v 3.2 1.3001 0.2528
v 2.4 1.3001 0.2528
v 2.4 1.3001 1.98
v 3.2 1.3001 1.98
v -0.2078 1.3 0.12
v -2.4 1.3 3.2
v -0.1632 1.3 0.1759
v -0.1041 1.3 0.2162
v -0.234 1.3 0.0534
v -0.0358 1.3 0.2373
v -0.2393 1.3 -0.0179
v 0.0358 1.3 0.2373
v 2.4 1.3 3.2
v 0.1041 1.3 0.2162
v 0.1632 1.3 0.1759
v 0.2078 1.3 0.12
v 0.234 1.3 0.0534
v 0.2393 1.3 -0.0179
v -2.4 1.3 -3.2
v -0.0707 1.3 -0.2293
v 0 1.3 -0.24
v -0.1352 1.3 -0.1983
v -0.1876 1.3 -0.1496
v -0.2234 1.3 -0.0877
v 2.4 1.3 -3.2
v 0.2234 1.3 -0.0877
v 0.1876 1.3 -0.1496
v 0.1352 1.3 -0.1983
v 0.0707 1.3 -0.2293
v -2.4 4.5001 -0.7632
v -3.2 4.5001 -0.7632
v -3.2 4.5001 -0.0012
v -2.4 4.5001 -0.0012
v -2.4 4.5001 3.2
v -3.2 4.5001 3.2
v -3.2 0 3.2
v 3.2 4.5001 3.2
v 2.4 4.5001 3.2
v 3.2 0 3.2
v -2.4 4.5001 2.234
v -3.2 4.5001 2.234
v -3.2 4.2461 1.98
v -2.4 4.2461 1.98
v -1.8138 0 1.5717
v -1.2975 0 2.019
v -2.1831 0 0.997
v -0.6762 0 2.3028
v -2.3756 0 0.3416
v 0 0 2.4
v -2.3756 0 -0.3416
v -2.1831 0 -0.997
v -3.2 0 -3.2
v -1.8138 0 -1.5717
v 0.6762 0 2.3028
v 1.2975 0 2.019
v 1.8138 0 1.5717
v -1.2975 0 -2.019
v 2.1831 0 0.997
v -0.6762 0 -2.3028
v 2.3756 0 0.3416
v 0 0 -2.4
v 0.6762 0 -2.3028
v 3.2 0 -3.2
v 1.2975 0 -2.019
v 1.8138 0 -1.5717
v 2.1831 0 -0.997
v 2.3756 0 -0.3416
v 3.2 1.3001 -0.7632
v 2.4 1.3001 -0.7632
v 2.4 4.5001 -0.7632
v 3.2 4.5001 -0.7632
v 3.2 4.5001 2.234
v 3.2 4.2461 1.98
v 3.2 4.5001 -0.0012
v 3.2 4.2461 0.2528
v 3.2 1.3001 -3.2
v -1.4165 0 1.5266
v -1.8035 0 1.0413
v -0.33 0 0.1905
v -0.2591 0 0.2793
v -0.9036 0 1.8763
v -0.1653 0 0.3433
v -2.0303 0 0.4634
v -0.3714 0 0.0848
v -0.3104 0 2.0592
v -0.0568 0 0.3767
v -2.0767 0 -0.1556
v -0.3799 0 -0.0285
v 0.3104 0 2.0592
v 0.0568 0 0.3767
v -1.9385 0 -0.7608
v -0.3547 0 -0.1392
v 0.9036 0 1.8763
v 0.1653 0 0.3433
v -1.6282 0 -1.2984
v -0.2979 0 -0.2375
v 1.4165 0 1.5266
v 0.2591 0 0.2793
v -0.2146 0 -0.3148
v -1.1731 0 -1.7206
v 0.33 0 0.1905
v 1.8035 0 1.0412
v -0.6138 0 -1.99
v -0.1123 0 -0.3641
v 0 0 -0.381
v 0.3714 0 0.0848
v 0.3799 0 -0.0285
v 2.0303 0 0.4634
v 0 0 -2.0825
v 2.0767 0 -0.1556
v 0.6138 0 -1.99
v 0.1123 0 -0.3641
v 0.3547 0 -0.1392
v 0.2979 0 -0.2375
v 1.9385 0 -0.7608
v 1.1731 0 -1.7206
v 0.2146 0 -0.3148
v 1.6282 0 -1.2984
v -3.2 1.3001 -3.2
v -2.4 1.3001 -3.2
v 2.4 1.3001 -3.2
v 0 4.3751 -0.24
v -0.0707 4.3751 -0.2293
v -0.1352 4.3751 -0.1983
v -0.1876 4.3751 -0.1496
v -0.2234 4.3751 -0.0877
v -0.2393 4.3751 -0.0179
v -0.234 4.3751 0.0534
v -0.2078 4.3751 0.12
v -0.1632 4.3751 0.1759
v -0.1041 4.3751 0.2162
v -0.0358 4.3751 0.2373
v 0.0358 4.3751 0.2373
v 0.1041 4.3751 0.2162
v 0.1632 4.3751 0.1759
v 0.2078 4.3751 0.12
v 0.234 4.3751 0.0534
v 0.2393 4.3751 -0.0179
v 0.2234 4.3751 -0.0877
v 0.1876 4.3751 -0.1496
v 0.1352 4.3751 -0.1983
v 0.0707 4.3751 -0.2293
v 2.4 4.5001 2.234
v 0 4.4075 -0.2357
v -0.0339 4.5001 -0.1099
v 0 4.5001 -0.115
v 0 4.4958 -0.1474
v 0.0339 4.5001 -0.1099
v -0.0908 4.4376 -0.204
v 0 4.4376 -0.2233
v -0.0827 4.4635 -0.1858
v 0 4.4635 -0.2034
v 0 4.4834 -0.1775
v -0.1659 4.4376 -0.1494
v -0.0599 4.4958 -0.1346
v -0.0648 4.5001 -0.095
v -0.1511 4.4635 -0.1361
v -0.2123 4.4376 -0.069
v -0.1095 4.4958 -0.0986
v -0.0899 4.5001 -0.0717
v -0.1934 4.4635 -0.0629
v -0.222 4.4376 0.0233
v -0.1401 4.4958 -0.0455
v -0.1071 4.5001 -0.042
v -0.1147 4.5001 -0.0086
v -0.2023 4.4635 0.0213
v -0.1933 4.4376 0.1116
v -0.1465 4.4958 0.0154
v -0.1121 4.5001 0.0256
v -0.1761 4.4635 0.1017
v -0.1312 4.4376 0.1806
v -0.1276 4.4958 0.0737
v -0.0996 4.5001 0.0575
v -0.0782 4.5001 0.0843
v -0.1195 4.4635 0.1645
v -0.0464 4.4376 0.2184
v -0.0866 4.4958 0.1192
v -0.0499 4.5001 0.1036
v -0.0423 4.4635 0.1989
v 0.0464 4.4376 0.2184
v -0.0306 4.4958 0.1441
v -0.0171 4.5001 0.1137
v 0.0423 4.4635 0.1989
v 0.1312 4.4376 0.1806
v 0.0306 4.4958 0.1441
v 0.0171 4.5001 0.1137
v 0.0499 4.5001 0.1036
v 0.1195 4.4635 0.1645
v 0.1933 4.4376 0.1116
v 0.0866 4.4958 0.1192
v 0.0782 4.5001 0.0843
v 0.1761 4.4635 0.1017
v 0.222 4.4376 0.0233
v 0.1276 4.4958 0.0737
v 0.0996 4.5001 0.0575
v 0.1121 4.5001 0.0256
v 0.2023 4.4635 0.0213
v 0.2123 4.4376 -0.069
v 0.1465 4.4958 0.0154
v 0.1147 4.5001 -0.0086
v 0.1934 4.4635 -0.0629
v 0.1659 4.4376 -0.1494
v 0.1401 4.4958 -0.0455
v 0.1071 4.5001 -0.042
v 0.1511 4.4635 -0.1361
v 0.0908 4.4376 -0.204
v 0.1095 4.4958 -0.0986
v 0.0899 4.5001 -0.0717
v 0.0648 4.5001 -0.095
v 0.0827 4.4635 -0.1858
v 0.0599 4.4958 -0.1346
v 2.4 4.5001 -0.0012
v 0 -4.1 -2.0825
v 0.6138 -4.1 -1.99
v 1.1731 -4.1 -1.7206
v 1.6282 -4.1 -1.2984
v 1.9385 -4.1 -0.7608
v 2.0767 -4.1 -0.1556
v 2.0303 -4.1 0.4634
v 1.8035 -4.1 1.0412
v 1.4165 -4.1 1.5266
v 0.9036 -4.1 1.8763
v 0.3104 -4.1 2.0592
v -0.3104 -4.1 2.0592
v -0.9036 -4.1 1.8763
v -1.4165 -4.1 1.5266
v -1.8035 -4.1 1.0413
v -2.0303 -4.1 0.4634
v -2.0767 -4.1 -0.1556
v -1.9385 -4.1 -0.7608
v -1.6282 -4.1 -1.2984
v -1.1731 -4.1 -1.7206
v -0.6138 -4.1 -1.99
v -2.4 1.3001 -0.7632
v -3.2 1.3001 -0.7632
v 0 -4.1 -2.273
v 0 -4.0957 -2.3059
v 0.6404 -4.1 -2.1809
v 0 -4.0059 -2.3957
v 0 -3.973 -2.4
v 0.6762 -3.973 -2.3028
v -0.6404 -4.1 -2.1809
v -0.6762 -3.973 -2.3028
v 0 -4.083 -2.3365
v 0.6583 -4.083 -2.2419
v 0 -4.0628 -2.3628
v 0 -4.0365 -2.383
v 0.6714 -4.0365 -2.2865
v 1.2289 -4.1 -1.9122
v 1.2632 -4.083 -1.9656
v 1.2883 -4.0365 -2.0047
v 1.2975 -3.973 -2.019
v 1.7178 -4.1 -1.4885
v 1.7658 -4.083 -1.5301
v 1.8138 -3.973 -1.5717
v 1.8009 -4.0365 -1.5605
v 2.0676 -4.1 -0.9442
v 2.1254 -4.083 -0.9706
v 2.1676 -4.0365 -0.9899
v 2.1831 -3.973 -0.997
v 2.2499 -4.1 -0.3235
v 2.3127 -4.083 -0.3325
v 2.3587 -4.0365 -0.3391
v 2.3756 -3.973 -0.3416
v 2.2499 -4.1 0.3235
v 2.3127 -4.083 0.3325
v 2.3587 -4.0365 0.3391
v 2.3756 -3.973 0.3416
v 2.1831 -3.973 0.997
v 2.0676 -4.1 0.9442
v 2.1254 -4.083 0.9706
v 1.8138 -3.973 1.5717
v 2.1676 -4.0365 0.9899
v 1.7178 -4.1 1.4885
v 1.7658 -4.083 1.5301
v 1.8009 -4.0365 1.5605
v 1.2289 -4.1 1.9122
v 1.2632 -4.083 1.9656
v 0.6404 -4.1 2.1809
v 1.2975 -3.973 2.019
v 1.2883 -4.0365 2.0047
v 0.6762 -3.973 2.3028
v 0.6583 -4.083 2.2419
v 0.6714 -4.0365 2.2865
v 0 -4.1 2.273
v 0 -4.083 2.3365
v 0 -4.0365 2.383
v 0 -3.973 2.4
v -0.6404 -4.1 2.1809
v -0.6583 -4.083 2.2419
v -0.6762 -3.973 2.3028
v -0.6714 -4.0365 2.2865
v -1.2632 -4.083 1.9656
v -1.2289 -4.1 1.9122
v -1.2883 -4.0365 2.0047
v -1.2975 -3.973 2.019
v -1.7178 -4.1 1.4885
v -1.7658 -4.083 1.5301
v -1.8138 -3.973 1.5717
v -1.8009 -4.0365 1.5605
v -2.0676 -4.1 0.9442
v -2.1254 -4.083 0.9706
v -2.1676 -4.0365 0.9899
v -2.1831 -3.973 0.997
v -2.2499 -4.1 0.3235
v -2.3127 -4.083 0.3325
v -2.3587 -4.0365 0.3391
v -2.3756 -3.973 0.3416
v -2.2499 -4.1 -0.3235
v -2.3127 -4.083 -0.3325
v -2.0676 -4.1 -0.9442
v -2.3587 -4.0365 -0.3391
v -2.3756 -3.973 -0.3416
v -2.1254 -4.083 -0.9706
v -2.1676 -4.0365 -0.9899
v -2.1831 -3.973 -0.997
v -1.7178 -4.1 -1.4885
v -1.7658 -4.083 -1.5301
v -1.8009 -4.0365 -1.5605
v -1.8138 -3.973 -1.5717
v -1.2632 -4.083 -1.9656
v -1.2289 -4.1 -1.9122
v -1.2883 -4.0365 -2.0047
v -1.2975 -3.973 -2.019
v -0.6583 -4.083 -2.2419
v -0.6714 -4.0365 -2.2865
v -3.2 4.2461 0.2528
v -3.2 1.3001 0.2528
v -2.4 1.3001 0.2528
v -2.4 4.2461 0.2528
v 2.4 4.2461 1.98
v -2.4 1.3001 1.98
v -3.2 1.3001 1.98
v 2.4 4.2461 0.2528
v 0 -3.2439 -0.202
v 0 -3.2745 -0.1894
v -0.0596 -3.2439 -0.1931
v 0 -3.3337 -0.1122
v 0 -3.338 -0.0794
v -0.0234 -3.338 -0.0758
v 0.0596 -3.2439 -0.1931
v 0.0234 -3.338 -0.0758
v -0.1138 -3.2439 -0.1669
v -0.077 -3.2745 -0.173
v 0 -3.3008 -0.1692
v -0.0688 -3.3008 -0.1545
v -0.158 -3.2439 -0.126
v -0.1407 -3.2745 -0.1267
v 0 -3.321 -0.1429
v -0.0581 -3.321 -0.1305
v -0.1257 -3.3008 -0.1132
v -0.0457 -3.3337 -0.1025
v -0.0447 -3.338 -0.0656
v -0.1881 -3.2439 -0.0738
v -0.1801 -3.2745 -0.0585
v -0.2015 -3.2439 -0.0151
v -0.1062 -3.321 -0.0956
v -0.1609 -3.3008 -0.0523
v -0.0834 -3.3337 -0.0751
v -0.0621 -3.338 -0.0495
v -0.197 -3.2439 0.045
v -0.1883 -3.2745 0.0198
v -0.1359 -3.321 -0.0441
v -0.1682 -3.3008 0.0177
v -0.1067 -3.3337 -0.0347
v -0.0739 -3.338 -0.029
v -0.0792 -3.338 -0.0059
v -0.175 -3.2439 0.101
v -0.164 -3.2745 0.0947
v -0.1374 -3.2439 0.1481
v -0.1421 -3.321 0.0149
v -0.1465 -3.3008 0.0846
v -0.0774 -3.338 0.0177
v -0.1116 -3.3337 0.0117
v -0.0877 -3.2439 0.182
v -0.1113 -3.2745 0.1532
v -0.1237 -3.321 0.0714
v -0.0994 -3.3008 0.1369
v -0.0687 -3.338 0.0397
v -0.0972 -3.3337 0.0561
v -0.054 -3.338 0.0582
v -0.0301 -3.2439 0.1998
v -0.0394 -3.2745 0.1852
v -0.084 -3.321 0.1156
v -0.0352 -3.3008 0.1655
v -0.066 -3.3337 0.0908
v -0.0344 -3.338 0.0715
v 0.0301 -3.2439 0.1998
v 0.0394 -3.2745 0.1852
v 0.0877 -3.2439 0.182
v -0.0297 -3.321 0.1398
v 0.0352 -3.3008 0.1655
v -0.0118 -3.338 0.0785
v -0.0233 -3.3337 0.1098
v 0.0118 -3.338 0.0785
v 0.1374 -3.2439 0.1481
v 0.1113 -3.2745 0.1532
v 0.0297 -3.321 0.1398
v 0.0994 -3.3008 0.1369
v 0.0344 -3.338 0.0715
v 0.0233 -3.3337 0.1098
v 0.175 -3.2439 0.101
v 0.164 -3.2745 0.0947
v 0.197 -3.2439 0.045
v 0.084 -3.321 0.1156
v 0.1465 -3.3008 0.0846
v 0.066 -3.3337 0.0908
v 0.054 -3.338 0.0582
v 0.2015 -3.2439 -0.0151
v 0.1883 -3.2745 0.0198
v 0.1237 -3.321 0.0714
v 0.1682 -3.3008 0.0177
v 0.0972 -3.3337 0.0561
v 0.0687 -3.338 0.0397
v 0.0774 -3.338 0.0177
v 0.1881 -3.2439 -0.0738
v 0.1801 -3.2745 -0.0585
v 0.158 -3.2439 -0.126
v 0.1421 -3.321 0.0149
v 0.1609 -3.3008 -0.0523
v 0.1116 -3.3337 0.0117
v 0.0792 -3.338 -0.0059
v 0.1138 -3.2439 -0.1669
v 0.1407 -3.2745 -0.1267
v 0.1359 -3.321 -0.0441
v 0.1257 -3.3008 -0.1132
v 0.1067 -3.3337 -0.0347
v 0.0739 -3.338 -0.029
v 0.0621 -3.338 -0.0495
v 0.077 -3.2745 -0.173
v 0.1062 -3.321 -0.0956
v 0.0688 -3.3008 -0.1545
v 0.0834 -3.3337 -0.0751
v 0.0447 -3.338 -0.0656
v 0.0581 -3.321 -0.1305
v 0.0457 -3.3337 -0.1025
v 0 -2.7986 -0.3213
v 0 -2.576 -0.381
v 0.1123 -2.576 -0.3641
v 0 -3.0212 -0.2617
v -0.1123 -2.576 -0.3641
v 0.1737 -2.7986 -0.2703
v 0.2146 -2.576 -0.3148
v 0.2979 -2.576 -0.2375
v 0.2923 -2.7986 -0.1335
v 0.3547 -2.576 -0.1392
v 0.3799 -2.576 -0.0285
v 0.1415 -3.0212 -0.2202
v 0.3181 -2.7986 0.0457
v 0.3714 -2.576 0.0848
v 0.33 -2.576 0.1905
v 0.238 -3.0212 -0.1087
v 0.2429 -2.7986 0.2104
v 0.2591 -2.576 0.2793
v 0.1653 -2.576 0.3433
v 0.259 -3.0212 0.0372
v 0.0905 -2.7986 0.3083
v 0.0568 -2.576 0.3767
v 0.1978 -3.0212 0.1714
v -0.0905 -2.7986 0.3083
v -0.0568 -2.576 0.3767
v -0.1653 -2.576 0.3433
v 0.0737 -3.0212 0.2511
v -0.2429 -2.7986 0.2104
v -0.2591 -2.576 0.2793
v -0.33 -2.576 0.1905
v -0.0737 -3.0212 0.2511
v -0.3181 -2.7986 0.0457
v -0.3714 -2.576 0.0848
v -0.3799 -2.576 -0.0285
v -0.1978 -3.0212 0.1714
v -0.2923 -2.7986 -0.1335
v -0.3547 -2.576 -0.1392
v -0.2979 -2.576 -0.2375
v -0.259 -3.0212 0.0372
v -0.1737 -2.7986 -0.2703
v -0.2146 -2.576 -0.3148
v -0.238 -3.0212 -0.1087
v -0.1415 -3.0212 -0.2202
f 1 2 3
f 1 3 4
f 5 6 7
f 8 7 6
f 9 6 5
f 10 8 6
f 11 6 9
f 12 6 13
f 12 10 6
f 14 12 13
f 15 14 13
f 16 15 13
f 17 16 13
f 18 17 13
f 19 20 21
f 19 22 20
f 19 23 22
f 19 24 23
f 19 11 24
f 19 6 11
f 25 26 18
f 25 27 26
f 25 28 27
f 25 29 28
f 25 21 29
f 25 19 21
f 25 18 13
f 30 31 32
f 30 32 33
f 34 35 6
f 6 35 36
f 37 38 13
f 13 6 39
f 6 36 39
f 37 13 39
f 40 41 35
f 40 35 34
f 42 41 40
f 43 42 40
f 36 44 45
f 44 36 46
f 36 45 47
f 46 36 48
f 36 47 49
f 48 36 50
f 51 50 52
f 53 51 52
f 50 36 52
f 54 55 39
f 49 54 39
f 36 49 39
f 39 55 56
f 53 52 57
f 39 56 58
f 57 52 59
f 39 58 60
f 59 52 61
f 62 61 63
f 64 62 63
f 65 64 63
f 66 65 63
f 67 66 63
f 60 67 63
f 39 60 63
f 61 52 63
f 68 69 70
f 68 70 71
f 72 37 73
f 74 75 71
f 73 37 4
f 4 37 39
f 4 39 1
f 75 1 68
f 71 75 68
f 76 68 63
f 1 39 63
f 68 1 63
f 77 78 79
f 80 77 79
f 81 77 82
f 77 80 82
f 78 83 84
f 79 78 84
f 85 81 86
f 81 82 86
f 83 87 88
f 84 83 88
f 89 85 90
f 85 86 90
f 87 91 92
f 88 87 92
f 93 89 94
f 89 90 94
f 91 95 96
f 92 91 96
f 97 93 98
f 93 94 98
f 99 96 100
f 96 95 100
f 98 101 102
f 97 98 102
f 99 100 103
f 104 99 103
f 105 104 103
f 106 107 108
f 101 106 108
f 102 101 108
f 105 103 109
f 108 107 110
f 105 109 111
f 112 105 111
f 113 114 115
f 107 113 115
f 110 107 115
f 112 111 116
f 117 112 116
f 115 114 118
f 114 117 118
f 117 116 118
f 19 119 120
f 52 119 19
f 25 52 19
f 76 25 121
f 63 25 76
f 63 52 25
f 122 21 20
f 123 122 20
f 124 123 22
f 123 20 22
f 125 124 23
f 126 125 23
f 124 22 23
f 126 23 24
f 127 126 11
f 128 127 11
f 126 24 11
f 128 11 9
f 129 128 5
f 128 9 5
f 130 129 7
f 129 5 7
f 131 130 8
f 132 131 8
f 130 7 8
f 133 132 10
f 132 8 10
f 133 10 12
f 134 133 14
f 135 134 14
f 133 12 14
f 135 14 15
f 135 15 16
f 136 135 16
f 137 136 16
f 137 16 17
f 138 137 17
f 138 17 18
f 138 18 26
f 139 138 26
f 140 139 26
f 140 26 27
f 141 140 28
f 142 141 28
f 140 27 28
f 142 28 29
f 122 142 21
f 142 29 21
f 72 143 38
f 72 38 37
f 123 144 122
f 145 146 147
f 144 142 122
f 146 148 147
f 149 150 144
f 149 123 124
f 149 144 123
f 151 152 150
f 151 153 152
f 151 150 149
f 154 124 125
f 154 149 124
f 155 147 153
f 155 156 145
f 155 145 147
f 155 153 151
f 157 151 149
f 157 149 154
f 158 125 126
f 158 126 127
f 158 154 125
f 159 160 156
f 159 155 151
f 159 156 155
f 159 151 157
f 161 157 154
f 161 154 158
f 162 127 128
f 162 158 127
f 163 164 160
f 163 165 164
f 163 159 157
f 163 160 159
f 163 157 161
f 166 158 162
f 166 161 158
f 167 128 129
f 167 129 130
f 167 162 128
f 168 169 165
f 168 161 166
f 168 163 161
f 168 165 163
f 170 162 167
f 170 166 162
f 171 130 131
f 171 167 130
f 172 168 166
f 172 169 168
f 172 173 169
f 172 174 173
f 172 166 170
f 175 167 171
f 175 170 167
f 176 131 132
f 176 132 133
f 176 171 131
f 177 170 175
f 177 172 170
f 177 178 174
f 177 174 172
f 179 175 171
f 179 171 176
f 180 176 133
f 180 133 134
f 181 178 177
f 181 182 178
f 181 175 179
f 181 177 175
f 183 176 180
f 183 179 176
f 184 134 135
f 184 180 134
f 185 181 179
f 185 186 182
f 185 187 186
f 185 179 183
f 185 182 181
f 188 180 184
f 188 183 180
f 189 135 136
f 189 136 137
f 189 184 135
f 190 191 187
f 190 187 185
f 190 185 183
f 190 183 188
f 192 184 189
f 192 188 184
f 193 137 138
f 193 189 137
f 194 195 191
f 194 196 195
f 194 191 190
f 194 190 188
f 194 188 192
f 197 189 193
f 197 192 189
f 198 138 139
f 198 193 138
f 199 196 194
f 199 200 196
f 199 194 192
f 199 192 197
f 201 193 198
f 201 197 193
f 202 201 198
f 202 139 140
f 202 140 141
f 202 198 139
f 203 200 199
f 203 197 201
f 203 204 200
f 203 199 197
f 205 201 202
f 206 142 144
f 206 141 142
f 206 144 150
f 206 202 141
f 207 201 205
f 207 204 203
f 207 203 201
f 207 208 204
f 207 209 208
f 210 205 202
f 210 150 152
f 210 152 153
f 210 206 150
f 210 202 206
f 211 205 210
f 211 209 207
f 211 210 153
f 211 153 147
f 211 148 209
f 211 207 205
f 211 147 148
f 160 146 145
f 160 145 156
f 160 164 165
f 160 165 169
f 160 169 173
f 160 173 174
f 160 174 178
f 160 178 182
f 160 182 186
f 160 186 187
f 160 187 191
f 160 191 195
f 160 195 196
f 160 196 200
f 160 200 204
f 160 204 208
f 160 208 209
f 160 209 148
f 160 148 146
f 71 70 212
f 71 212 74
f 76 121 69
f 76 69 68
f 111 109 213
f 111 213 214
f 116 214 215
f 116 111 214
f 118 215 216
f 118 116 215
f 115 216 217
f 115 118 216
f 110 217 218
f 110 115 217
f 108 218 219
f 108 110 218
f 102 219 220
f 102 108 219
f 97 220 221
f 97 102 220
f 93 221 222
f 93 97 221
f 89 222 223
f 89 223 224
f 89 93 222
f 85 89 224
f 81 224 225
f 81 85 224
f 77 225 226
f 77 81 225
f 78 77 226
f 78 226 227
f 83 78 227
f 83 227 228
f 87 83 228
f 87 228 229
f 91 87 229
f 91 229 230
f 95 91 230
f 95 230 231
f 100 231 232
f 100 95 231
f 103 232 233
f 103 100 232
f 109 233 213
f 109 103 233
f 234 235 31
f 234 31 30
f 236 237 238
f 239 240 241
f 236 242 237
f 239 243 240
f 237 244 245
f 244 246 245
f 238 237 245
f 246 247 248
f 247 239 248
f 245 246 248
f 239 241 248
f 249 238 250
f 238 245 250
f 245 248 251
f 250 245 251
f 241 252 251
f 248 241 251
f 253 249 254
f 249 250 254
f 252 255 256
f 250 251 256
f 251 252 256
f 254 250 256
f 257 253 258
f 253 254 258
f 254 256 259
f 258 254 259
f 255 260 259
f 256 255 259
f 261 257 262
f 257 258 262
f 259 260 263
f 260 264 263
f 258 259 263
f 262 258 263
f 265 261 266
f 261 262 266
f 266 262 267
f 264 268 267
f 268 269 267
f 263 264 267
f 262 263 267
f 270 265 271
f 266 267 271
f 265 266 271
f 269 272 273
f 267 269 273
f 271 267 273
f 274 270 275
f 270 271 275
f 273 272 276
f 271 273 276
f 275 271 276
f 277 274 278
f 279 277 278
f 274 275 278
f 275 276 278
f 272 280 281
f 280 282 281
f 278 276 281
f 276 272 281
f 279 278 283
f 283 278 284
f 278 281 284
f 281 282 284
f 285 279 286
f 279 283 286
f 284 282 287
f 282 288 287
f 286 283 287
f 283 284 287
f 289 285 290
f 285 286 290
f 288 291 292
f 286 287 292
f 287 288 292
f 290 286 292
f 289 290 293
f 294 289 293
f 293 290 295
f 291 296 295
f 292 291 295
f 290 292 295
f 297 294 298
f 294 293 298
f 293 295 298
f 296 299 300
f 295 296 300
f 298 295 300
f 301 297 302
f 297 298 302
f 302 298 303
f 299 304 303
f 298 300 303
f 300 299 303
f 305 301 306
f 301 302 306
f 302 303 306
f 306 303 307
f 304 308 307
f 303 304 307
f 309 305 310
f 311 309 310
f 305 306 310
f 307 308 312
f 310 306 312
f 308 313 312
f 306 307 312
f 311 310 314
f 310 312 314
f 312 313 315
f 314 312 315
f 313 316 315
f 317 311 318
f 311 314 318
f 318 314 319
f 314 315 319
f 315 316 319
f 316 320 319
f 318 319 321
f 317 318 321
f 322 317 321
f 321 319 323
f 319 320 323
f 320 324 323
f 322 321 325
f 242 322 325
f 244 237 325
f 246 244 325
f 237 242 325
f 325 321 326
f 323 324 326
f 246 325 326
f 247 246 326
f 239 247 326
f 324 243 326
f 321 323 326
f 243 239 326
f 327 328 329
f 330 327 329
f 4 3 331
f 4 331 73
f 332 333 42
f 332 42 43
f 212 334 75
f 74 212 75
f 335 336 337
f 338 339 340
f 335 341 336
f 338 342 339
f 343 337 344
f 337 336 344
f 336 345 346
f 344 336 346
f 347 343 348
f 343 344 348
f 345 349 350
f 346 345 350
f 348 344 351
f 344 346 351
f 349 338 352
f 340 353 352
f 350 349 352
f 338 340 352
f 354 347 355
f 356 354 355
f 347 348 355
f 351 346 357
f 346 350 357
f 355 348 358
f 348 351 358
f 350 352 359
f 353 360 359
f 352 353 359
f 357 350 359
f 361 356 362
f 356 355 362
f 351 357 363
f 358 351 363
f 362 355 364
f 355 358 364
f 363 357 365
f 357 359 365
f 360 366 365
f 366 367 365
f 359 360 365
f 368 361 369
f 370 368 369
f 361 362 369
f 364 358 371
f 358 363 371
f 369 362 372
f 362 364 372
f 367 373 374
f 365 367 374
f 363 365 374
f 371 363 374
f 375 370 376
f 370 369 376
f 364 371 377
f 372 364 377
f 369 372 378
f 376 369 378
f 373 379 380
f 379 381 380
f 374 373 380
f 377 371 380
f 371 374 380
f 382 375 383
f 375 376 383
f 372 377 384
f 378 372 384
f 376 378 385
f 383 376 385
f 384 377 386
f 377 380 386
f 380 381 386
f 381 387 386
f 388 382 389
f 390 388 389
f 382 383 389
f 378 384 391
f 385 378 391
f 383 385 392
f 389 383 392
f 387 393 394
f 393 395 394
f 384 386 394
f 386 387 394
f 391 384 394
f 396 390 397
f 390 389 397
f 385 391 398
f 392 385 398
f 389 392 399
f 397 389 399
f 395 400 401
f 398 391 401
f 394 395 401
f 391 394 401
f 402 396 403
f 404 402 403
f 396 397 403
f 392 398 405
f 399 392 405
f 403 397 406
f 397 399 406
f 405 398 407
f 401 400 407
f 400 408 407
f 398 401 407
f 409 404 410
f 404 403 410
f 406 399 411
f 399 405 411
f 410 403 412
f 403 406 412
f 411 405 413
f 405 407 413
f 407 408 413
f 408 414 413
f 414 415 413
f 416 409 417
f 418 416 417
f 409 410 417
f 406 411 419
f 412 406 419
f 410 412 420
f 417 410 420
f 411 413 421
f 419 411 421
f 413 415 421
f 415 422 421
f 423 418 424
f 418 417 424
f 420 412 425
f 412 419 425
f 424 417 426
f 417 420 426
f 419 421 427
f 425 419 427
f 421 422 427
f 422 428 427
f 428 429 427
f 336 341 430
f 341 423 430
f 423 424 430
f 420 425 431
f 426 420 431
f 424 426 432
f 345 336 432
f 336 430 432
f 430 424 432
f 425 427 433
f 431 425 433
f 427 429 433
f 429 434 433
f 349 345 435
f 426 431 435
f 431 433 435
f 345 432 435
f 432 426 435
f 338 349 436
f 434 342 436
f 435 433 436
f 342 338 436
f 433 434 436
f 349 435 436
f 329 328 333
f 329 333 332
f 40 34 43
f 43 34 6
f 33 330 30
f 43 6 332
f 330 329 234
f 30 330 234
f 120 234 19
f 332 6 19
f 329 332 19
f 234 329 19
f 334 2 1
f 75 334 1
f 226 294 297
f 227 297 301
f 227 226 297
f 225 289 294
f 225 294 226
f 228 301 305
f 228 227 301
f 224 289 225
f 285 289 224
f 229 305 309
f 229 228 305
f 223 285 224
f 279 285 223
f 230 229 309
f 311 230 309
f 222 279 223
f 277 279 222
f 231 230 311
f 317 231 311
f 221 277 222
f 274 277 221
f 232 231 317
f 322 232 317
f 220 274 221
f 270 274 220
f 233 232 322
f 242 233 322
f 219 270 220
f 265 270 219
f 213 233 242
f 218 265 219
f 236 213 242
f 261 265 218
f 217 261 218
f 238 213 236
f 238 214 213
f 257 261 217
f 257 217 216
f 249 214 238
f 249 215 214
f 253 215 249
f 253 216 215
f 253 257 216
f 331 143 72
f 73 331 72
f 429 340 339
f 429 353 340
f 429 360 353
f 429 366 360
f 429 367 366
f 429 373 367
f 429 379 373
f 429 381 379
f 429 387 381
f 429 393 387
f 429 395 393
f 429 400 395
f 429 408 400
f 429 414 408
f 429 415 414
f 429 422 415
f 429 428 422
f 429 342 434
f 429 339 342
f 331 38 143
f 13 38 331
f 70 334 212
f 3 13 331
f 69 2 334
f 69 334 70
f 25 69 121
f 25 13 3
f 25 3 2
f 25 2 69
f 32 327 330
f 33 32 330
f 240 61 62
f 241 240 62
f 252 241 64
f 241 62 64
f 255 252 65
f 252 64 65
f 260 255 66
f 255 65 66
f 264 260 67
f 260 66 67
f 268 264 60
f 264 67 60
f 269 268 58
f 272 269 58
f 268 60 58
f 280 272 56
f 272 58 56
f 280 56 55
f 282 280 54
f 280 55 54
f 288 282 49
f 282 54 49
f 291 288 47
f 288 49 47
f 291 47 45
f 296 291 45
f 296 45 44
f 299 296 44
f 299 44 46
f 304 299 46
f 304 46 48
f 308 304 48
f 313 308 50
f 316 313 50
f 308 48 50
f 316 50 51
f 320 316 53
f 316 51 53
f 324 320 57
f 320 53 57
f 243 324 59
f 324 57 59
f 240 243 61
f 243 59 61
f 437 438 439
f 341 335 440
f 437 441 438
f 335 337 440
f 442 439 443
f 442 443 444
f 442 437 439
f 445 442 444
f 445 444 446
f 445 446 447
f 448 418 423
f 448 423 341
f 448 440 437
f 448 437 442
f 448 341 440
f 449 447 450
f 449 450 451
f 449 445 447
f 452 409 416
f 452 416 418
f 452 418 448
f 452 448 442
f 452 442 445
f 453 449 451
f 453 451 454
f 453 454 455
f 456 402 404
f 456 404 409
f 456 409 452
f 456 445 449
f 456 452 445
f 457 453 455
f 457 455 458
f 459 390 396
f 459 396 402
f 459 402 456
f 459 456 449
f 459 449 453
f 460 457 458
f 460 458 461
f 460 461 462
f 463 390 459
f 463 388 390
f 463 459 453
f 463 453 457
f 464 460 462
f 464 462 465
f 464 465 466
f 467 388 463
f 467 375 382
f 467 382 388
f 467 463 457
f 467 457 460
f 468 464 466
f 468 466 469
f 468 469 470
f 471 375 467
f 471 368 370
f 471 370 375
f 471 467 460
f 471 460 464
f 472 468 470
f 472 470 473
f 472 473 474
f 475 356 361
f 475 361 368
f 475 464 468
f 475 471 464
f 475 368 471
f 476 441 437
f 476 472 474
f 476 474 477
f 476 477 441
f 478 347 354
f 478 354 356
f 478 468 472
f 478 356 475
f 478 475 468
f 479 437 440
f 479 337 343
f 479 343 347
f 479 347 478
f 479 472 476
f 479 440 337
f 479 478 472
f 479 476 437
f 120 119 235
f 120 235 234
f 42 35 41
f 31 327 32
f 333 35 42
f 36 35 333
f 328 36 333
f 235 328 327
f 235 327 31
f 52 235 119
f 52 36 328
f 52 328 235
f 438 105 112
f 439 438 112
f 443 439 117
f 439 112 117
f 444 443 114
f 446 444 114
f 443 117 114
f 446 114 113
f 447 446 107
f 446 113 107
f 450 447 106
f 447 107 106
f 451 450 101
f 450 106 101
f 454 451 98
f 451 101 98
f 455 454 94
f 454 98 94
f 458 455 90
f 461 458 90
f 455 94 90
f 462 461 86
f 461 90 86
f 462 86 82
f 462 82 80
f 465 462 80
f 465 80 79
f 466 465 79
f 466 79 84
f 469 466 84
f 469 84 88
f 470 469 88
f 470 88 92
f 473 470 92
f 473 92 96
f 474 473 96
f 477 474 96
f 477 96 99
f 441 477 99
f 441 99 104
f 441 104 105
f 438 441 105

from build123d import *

# Parameters (mm, degrees)
SKETCH1_W           = 6.4
SKETCH1_H           = 6.4
BOSS_EXTRUDE1_DEPTH = 1.3
SKETCH2_W           = 0.8
SKETCH2_H           = 6.4
BOSS_EXTRUDE2_DEPTH = 0.0001
SKETCH3_W           = 0.8
SKETCH3_H           = 1.22
SKETCH3_H_2         = 1.016
BOSS_EXTRUDE3_DEPTH = 3.2
CHAMFER1_SIZE       = 0.254
SKETCH4_R           = 0.24
BOSS_EXTRUDE4_DEPTH = 3.2001
FILLET1_R           = 0.125
SKETCH5_R           = 2.4
SKETCH5_R_2         = 2.0825
SKETCH5_R_3         = 0.381
BOSS_EXTRUDE5_DEPTH = 4.1
CUT_EXTRUDE1_START  = -1.524
SKETCH7_R           = 0.381
CUT_EXTRUDE1_DEPTH  = 1.524
SKETCH8_R           = 0.381
BOSS_EXTRUDE6_DEPTH = 0.762
BOSS_EXTRUDE6_TAPER = 15
FILLET2_R           = 0.127
FILLET3_R           = 0.127


with BuildPart() as part:
    # Sketch1 → Boss-Extrude1 (new body)
    with BuildSketch(Plane(origin=(0, 0, 0), x_dir=(1, 0, 0), z_dir=(0, 1, 0))):
        Rectangle(SKETCH1_W, SKETCH1_H)
    extrude(amount=BOSS_EXTRUDE1_DEPTH)

    # Sketch2 → Boss-Extrude2 (add)
    with BuildSketch(Plane(origin=(0, 1.3, 0), x_dir=(1, 0, 0), z_dir=(0, 1, 0))):
        with Locations((-2.8, 0)):
            Rectangle(SKETCH2_W, SKETCH2_H)
        with Locations((2.8, 0)):
            Rectangle(SKETCH2_W, SKETCH2_H)
    extrude(amount=BOSS_EXTRUDE2_DEPTH)

    # Sketch3 → Boss-Extrude3 (add)
    with BuildSketch(Plane(origin=(0, 1.3001, 0), x_dir=(1, 0, 0), z_dir=(0, 1, 0))):
        with Locations((-2.8, -2.59)):
            Rectangle(SKETCH3_W, SKETCH3_H)
        with Locations((-2.8, 0.2552)):
            Rectangle(SKETCH3_W, SKETCH3_H_2)
        with Locations((2.8, 0.2552)):
            Rectangle(SKETCH3_W, SKETCH3_H_2)
        with Locations((2.8, -2.59)):
            Rectangle(SKETCH3_W, SKETCH3_H)
    extrude(amount=BOSS_EXTRUDE3_DEPTH)

    # Chamfer1
    chamfer1_edges = [part.edges().sort_by_distance(p)[0] for p in [
        (-2.8, 4.5001, 1.98),
        (-2.8, 4.5001, 0.2528),
        (2.8, 4.5001, 0.2528),
        (2.8, 4.5001, 1.98),
    ]]
    chamfer(chamfer1_edges, length=CHAMFER1_SIZE)

    # Sketch4 → Boss-Extrude4 (add)
    with BuildSketch(Plane(origin=(0, 1.3, 0), x_dir=(1, 0, 0), z_dir=(0, 1, 0))):
        with Locations(Location((0, 0, 0), (0, 0, 90))):
            Circle(SKETCH4_R)
    extrude(amount=BOSS_EXTRUDE4_DEPTH)

    # Fillet1
    fillet1_edges = [part.edges().sort_by_distance(p)[0] for p in [
        (0, 4.5001, 0.24),
    ]]
    fillet(fillet1_edges, radius=FILLET1_R)

    # Sketch5 → Boss-Extrude5 (add)
    # profile 1 of 2: a face of its own
    with BuildSketch(Plane.XZ):
        with Locations(Location((0, 0, 0), (0, 0, 270))):
            Circle(SKETCH5_R)
        with Locations(Location((0, 0, 0), (0, 0, 270))):
            Circle(SKETCH5_R_2, mode=Mode.SUBTRACT)
    # profile 2 of 2: a face of its own
    with BuildSketch(Plane.XZ):
        with Locations(Location((0, 0, 0), (0, 0, 270))):
            Circle(SKETCH5_R_3)
    extrude(amount=BOSS_EXTRUDE5_DEPTH)

    # Sketch7 → Cut-Extrude1 (cut)
    with BuildSketch(Plane.XZ.offset(4.1).offset(CUT_EXTRUDE1_START)):
        with Locations(Location((0, 0, 0), (0, 0, 270))):
            Circle(SKETCH7_R)
    extrude(amount=CUT_EXTRUDE1_DEPTH, mode=Mode.SUBTRACT)

    # Sketch8 → Boss-Extrude6 (add)
    with BuildSketch(Plane.XZ.offset(2.576)):
        with Locations(Location((0, 0, 0), (0, 0, 270))):
            Circle(SKETCH8_R)
    extrude(amount=BOSS_EXTRUDE6_DEPTH, taper=BOSS_EXTRUDE6_TAPER)

    # Fillet2
    fillet2_edges = [part.edges().sort_by_distance(p)[0] for p in [
        (0, -3.338, 0.176822715),
    ]]
    fillet(fillet2_edges, radius=FILLET2_R)

    # Fillet3
    fillet3_edges = [part.edges().sort_by_distance(p)[0] for p in [
        (0, -4.1, 2.4),
    ]]
    fillet(fillet3_edges, radius=FILLET3_R)


solid = part.part
